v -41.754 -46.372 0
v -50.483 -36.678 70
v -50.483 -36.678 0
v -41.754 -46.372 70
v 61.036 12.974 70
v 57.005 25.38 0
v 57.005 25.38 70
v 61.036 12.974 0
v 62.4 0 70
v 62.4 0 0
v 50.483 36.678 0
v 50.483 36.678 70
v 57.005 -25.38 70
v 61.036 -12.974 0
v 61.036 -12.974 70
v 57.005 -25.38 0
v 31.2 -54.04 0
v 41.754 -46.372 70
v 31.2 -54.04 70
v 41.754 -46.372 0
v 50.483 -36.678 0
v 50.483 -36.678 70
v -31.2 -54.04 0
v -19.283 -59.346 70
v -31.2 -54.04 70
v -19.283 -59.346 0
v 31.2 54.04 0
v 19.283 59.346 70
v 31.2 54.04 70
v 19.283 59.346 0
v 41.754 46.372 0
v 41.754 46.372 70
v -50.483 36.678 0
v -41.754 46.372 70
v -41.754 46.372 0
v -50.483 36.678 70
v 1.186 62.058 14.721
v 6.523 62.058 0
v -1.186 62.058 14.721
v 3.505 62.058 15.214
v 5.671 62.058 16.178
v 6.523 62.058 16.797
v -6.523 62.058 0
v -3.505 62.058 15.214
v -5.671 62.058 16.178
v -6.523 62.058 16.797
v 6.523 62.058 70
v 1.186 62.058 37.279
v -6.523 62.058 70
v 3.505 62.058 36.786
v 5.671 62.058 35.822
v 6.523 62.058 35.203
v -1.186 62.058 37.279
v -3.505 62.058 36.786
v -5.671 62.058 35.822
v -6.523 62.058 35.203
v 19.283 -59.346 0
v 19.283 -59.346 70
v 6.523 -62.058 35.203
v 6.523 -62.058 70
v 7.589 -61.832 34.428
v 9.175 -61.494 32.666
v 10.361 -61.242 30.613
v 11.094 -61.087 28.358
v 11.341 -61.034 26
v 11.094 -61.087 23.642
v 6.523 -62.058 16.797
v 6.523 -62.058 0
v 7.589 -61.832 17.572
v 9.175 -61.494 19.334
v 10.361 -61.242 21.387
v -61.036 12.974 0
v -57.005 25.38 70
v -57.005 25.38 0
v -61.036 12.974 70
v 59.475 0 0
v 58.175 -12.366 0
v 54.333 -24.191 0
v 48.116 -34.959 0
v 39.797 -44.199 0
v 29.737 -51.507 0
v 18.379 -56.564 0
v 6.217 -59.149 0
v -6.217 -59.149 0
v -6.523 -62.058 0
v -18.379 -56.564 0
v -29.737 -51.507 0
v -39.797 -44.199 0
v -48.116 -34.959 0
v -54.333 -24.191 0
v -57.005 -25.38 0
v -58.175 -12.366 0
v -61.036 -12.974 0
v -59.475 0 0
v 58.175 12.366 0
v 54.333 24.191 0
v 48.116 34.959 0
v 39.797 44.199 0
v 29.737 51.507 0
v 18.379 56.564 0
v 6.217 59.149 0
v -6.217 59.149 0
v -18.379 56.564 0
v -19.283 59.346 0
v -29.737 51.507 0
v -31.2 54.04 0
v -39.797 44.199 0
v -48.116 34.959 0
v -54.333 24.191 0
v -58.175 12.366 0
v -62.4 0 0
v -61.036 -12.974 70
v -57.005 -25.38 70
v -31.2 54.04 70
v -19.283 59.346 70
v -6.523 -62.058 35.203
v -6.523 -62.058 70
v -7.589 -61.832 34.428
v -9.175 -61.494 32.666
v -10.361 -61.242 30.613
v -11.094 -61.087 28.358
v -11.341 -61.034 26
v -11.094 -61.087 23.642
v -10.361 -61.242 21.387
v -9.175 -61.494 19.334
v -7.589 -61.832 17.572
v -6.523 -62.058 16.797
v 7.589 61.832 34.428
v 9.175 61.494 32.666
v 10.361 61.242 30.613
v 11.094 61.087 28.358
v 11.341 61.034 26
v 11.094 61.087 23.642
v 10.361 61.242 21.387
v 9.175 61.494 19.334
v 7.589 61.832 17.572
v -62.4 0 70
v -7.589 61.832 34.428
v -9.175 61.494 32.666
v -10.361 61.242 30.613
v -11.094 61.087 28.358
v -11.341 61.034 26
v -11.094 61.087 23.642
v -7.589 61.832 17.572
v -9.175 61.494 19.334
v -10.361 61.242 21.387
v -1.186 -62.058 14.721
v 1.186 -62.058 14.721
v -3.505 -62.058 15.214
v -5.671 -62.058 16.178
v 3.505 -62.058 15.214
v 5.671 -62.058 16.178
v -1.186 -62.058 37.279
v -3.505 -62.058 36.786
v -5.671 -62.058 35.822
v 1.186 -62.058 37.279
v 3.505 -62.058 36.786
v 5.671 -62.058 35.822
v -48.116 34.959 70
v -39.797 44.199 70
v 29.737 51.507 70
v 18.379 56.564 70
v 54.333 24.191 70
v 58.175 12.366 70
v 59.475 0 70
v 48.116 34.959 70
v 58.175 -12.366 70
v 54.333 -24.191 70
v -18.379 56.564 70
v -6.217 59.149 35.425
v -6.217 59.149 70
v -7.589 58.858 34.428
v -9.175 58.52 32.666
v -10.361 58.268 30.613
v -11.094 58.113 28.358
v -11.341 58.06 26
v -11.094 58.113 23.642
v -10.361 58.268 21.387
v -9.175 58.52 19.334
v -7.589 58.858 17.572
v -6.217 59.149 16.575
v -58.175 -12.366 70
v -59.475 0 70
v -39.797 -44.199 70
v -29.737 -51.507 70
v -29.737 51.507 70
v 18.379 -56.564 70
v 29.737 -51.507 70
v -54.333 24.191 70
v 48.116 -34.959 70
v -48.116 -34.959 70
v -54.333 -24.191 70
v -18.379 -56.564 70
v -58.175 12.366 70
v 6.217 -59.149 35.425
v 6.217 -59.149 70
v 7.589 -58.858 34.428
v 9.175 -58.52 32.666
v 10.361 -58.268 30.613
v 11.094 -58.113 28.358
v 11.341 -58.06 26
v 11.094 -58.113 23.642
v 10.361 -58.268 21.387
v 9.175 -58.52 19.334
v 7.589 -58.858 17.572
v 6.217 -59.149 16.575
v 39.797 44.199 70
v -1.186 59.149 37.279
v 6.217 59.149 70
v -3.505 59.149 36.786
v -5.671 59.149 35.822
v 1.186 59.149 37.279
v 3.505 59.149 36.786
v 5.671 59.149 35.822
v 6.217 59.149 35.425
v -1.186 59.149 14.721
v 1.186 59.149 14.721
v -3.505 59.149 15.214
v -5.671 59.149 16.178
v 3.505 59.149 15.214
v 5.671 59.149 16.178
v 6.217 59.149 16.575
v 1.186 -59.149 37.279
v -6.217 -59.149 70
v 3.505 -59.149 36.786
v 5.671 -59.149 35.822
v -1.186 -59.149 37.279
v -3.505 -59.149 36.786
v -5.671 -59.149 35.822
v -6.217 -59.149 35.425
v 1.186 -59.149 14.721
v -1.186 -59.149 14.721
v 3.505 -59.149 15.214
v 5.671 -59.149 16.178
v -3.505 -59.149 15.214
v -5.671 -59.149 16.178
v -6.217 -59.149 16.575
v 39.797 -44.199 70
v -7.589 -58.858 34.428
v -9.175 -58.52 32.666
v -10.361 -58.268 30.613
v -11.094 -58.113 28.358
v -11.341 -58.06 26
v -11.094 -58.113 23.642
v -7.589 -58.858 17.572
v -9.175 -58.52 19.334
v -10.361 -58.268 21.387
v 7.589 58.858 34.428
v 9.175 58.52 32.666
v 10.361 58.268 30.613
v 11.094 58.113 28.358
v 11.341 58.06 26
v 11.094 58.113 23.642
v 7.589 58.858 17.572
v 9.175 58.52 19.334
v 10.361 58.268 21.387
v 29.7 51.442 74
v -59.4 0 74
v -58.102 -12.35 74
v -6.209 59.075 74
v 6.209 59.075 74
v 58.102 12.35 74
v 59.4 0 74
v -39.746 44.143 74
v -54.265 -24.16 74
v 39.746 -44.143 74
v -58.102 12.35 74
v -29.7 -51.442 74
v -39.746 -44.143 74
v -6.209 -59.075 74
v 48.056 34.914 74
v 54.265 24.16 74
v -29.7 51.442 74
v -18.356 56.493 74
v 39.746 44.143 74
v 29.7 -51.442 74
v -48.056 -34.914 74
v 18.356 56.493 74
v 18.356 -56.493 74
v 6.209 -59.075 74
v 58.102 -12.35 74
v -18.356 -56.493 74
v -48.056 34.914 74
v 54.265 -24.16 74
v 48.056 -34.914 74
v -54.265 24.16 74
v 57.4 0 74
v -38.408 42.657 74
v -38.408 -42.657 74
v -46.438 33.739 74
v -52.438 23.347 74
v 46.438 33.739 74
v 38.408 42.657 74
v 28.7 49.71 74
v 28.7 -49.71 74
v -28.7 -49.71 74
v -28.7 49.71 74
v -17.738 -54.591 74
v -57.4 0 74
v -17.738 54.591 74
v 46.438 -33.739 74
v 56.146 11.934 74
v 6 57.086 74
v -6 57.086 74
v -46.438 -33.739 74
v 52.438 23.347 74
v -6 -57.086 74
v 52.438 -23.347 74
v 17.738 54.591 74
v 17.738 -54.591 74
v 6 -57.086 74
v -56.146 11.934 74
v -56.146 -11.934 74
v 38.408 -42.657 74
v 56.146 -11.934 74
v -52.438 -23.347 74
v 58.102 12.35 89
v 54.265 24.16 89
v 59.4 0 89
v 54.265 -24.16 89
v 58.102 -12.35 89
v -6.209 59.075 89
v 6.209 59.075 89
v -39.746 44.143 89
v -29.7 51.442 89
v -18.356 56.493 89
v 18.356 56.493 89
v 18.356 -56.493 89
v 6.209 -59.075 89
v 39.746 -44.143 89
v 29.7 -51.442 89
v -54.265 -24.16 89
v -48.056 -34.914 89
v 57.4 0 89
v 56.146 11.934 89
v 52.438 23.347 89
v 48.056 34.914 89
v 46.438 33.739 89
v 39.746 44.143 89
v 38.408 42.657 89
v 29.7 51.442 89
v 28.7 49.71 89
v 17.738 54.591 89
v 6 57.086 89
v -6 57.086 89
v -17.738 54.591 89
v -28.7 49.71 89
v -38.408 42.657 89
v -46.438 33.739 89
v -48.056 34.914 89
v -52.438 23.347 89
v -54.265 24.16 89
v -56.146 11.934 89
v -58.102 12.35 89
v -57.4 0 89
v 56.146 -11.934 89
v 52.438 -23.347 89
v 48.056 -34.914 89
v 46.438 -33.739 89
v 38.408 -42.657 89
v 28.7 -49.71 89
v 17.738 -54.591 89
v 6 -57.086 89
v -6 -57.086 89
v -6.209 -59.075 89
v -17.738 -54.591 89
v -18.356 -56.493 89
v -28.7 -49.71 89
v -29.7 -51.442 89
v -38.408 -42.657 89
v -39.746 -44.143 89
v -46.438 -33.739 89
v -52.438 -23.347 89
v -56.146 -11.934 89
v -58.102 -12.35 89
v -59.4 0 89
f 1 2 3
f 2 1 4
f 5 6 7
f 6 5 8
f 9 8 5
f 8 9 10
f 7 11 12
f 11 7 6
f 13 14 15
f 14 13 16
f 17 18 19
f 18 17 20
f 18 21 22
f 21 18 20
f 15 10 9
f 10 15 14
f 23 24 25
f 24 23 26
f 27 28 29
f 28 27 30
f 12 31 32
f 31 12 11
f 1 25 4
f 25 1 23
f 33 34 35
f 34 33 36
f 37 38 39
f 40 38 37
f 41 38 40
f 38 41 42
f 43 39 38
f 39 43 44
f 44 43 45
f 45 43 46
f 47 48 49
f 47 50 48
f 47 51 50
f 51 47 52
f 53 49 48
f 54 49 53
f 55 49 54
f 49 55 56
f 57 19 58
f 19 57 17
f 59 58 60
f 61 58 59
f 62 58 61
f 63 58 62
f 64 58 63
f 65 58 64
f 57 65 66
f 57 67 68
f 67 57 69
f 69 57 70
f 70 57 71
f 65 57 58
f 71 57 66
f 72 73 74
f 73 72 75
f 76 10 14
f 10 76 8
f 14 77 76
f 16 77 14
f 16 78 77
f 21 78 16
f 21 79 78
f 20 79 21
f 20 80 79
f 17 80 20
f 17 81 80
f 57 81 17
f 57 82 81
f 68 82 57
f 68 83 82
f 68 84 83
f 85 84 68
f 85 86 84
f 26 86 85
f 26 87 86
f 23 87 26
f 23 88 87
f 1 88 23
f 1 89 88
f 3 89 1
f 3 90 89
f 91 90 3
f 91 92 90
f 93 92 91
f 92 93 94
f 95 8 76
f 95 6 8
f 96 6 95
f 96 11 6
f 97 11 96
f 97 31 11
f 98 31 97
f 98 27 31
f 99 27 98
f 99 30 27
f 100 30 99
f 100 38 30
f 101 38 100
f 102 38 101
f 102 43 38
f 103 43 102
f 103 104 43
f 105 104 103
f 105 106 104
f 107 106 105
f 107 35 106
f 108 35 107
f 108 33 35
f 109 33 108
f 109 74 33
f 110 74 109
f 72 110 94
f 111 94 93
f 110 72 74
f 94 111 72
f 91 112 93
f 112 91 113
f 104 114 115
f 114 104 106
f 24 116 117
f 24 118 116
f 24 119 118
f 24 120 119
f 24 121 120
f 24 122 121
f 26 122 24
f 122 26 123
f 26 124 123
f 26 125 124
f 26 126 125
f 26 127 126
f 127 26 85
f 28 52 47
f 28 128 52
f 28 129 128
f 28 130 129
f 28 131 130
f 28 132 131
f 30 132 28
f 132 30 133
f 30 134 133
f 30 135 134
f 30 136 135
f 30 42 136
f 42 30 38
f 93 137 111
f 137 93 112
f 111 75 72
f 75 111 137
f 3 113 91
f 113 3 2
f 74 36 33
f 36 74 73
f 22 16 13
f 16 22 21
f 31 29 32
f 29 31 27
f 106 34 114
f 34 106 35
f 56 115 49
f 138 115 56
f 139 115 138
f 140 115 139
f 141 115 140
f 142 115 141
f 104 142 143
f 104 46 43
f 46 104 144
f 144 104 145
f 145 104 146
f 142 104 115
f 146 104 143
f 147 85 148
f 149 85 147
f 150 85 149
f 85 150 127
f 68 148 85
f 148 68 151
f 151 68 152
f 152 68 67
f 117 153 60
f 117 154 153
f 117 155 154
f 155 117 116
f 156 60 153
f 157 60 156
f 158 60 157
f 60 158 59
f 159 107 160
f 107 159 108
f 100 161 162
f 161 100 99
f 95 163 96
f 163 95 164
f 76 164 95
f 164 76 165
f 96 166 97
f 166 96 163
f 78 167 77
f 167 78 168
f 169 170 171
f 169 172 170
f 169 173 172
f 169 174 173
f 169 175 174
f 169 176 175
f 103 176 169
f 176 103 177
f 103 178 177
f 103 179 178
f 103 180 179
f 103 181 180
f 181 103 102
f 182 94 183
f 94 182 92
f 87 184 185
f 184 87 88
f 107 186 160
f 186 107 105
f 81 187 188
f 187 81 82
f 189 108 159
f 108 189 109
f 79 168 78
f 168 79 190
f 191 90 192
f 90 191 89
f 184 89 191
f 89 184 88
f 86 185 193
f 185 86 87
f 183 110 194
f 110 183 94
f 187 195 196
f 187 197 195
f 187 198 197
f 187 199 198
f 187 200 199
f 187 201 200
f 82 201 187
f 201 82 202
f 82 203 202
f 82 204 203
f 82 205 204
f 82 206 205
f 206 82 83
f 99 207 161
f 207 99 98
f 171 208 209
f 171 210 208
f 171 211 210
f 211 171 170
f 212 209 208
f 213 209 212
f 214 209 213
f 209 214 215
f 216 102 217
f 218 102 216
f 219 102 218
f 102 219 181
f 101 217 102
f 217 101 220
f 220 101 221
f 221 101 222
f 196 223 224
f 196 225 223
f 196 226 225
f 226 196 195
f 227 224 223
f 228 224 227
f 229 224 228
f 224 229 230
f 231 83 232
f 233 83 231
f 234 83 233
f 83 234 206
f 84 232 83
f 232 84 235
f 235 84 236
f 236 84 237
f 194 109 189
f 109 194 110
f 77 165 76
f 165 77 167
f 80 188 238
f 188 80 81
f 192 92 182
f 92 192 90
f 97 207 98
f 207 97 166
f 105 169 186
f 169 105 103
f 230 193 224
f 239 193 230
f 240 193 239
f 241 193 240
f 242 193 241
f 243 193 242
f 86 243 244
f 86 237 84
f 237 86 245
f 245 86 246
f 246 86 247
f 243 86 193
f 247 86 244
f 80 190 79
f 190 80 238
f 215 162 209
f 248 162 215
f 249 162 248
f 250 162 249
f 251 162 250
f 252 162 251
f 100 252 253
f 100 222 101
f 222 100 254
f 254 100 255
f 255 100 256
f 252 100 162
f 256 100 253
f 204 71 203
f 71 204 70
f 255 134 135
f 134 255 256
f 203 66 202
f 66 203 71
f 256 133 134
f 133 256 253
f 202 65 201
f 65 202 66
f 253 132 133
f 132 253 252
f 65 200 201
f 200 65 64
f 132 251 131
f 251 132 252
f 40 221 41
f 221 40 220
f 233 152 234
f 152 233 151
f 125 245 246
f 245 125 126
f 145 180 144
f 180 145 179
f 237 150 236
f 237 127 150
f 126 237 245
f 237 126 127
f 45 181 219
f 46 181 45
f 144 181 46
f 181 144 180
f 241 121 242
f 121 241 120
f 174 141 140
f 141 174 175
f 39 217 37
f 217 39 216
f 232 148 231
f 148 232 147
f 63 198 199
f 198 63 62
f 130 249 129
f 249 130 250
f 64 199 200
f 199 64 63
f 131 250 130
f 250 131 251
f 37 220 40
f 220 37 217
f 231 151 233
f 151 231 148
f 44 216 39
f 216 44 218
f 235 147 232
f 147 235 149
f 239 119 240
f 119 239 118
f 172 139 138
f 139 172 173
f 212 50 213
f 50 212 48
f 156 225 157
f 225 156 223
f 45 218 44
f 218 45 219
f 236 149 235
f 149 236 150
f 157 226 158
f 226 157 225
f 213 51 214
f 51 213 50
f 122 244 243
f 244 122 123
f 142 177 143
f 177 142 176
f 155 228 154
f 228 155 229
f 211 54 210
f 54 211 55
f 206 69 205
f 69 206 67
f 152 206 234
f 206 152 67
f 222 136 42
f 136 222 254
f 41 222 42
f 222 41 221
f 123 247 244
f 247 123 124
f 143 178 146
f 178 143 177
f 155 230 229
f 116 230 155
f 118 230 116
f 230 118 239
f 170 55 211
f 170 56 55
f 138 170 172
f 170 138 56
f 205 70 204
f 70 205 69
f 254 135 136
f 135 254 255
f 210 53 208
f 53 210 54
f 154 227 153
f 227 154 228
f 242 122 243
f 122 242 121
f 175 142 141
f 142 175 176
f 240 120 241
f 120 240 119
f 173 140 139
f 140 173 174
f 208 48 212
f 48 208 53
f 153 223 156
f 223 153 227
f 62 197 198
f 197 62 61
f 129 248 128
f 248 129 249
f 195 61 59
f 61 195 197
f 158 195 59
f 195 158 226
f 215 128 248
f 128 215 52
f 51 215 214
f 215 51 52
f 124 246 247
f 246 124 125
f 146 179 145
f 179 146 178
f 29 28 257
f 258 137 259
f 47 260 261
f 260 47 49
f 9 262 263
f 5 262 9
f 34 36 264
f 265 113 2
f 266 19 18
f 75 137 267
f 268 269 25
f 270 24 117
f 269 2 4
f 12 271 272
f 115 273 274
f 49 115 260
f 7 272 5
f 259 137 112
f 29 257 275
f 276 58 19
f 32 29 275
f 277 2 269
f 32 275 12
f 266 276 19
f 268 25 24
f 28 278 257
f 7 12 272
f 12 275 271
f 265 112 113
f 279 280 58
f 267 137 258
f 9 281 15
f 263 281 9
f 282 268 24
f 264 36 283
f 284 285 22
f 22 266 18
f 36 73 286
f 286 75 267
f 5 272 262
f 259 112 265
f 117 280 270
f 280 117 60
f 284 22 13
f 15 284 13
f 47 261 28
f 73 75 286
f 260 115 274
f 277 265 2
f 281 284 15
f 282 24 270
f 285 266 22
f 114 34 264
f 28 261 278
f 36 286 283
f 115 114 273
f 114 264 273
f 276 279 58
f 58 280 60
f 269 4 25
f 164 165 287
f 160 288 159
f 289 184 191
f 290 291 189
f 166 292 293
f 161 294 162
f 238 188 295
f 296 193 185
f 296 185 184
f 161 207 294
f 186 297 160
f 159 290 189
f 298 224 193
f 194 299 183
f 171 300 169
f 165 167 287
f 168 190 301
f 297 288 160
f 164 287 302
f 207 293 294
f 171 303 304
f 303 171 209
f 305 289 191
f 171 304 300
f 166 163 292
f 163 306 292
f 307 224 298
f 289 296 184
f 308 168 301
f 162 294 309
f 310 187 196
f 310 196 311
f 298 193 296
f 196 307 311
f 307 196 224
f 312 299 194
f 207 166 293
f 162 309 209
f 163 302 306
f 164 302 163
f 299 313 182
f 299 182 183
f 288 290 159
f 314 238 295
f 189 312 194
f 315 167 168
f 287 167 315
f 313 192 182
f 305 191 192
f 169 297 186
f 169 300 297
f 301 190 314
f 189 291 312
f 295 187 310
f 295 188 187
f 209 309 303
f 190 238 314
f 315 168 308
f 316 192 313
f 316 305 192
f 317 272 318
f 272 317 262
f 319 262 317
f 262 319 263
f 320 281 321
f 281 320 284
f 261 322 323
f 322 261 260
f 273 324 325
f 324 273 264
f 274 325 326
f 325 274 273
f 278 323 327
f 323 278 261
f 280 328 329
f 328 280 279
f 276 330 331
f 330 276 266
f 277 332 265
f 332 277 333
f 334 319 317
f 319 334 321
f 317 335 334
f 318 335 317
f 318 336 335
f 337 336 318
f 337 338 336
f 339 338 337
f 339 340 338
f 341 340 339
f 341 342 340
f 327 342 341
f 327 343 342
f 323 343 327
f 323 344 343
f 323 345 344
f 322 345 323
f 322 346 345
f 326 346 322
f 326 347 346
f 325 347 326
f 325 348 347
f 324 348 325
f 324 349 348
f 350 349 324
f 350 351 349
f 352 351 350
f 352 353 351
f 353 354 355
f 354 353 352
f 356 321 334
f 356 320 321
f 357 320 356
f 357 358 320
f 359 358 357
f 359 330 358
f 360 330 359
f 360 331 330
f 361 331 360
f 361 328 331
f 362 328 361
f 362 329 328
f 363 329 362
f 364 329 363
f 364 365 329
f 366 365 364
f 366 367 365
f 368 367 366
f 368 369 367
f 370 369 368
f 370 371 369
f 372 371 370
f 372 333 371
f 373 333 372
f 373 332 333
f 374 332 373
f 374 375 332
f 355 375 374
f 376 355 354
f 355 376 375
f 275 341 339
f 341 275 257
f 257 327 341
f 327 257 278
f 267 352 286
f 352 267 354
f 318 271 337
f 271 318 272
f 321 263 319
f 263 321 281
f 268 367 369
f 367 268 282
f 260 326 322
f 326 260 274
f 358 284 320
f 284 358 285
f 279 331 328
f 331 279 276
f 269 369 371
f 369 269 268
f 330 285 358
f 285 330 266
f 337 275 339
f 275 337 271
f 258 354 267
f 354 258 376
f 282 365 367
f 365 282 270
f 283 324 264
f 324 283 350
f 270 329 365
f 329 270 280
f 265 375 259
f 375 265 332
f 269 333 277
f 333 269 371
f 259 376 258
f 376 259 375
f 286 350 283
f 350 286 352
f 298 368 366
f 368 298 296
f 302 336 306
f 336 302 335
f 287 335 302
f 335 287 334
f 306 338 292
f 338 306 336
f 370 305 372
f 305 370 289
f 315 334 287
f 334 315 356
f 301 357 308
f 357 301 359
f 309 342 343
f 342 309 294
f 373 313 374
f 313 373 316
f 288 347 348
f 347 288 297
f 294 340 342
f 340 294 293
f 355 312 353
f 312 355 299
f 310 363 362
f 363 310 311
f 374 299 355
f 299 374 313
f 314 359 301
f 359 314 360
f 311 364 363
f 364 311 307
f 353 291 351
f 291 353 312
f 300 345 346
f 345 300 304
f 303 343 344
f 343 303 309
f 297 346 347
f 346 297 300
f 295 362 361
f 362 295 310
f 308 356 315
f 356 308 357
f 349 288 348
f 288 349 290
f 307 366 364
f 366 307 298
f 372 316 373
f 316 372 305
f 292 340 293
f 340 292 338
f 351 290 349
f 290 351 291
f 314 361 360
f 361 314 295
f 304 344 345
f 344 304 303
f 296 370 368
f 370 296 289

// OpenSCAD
/*
Connecting 125mm Pipe Hack - Shorty
for Weather Station
Remixed for https://www.thingiverse.com/thing:5990046
Metric PVC pipes are hard to find in the USA

Created October 13, 2023
Modified October 31, 2024
*/

// see https://epco-plastics.com/news/post/inch-and-metric-pipe-dimensions

pvc_125_id = 118.8;
pvc_125_od = 125; // OD of metric pipe
nozzle_size = 0.6;

ht = 70;

id = pvc_125_id + 0.15;
od = pvc_125_id + floor((pvc_125_od - pvc_125_id) / nozzle_size) * nozzle_size; // make wall size nultiple of nozzle size (0.6)
echo("OD", od);

hole_d = 2;
hole_z_off = 5 + 11;

base_to_pipe_ctr = 26;
base_pipe_d = 20.683 + 2;
pipe_cut_cyl_h = od + 5;

skinny_od = 118.2 + 0.6; // same as funnel fitting OD, just tighter fit
skinny_id = skinny_od - 4; // can be thin here

taper_h = 4;
skinny_h = 15;

$fs = 0.2;

difference() {
    cylinder(d=od, h=ht);
    cylinder(d=id, h=ht);

    color("purple")
    translate([0, -pipe_cut_cyl_h/2, base_to_pipe_ctr])
    rotate([270, 0, 0])
    cylinder(d=base_pipe_d, h=pipe_cut_cyl_h);
}

translate([0, 0, ht])
difference() {
    cylinder(d1=od, d2=skinny_od, h=taper_h);

    cylinder(d1=id, d2=skinny_id, h=taper_h);
}

translate([0, 0, ht + taper_h])
    difference() {
        cylinder(d=skinny_od, h=skinny_h);

        cylinder(d=skinny_id, h=skinny_h);
    }
